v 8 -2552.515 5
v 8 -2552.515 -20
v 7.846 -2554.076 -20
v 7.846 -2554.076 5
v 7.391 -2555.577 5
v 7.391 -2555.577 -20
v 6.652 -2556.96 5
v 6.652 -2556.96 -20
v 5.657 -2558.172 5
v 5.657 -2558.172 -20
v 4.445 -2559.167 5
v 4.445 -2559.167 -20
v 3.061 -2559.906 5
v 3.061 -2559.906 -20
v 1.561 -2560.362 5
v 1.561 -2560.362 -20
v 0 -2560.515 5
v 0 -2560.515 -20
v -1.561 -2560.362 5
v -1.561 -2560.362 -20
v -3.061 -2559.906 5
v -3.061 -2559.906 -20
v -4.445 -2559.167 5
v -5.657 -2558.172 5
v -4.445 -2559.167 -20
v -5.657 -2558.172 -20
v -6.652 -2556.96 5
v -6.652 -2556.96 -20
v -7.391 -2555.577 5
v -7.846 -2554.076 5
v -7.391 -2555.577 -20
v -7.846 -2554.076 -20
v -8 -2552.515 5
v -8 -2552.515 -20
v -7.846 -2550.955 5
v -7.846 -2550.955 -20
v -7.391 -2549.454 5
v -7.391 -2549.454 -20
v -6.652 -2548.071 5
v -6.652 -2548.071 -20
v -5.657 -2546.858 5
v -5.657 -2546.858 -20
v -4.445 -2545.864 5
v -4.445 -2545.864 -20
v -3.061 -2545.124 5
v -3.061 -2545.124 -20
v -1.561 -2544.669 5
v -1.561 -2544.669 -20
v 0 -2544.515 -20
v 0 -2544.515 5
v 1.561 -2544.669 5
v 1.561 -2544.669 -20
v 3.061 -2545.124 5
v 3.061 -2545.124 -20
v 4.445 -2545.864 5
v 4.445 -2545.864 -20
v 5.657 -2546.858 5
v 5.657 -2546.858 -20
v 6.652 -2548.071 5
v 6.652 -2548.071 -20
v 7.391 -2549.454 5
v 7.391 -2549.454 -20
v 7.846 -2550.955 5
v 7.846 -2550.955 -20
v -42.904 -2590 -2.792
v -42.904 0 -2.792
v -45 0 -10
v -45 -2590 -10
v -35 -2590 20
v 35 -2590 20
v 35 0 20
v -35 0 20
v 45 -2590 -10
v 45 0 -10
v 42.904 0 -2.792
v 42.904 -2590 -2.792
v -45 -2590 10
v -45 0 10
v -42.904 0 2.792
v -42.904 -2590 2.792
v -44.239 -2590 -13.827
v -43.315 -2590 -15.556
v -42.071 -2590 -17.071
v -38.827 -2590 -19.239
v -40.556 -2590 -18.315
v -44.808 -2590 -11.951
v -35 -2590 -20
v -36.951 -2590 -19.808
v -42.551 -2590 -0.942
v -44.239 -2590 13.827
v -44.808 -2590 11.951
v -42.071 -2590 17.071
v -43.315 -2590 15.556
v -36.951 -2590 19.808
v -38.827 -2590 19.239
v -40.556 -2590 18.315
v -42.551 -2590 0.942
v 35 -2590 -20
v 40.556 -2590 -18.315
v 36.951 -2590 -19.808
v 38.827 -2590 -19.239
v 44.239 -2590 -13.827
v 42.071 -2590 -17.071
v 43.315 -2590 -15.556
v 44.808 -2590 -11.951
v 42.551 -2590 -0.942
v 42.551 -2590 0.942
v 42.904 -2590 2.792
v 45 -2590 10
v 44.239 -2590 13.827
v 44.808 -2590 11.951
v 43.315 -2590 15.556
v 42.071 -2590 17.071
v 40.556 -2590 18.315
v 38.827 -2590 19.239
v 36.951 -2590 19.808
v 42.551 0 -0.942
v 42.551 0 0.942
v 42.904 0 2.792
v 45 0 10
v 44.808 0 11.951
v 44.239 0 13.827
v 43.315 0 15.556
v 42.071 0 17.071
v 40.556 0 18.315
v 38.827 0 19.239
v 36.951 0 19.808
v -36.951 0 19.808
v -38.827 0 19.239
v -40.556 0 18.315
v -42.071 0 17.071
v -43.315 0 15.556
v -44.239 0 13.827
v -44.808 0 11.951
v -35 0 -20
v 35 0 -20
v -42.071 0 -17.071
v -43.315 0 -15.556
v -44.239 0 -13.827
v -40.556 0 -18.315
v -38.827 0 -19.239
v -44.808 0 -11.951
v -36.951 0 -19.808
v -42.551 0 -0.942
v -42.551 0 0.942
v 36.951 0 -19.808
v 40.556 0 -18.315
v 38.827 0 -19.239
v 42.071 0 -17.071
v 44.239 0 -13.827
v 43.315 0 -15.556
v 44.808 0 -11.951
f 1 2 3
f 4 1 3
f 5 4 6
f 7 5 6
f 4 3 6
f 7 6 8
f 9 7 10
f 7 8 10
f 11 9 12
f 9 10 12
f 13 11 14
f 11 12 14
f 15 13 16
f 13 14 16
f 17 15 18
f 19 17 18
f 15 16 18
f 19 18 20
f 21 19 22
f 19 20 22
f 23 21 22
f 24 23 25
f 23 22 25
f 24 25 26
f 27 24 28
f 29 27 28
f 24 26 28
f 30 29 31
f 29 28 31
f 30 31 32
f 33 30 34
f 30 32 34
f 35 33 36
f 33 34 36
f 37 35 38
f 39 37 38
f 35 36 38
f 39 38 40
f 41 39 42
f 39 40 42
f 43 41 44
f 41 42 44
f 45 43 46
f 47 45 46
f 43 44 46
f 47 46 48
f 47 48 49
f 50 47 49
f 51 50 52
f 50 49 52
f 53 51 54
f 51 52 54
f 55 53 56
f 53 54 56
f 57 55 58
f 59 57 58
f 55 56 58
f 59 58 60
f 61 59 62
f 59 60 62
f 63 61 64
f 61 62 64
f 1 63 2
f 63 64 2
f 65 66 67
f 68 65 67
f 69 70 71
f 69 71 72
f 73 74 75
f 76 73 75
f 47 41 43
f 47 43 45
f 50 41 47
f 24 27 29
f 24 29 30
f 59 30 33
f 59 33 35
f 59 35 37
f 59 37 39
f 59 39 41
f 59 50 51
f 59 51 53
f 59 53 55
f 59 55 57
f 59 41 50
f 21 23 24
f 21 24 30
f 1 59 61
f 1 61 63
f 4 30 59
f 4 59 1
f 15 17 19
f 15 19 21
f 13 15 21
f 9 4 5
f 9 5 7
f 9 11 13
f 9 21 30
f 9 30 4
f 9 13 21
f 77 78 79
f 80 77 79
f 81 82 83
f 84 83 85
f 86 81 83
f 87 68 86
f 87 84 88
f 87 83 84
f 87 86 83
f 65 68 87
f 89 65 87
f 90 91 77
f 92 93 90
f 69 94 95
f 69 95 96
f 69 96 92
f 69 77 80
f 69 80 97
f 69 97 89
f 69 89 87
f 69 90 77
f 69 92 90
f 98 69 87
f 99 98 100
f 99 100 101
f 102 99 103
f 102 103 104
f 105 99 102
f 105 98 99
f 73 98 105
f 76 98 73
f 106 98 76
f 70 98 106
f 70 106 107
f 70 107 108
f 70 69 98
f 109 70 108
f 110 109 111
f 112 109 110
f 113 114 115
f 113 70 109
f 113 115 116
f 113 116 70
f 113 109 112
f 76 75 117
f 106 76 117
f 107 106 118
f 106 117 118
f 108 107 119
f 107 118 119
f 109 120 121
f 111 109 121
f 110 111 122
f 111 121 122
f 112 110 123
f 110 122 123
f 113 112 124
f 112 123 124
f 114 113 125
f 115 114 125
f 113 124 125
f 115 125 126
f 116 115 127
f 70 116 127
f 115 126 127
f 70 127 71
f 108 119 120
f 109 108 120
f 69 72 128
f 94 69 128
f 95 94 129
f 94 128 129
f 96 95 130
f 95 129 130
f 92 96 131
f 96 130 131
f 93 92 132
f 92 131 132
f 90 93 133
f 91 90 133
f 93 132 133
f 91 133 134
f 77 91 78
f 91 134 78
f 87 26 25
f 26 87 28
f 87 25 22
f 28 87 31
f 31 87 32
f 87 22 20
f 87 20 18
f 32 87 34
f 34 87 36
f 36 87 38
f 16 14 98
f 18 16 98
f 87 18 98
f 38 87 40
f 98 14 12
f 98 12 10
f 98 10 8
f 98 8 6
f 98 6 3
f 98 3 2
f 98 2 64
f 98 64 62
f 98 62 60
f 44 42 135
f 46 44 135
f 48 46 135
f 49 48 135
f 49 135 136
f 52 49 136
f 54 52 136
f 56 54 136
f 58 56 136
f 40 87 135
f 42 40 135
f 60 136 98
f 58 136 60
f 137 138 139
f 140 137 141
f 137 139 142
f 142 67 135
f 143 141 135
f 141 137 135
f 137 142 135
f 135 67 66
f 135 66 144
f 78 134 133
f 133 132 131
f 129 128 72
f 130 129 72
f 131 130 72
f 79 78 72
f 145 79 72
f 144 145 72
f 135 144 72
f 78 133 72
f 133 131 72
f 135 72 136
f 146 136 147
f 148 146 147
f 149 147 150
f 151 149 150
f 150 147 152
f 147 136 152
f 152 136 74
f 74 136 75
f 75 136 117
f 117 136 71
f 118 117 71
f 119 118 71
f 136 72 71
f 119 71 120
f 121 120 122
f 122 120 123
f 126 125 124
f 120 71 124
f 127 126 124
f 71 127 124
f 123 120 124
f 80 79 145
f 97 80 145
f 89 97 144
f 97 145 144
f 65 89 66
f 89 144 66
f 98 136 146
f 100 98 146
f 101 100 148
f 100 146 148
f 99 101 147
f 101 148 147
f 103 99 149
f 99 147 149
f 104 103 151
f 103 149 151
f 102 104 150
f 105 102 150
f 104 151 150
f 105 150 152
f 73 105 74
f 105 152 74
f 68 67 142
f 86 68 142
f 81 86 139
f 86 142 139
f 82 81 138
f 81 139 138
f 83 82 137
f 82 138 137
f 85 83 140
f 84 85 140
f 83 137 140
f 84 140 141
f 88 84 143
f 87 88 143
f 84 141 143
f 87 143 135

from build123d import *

# Parameters (mm, degrees)
F1_DEPTH = 2590
F2_R     = 8
F3_DEPTH = 25


with BuildPart() as f1:
    # F0 (on Front) → F1 (new body)
    with BuildSketch(Plane.XZ):
        with BuildLine():
            Line((-35, -20), (35, -20))
            ThreePointArc((35, -20), (42.071068, -17.071068), (45, -10))
            Line((45, -10), (42.904106, -2.792146))
            ThreePointArc((42.904106, -2.792146), (42.506393, 0), (42.904106, 2.792146))
            Line((42.904106, 2.792146), (45, 10))
            ThreePointArc((45, 10), (42.071068, 17.071068), (35, 20))
            Line((35, 20), (-35, 20))
            ThreePointArc((-35, 20), (-42.071068, 17.071068), (-45, 10))
            Line((-45, 10), (-42.904106, 2.792146))
            ThreePointArc((-42.904106, 2.792146), (-42.506393, 0), (-42.904106, -2.792146))
            Line((-42.904106, -2.792146), (-45, -10))
            ThreePointArc((-45, -10), (-42.071068, -17.071068), (-35, -20))
        make_face()
    extrude(amount=F1_DEPTH)

    # F2 (on face) → F3 (cut)
    with BuildSketch(Plane(origin=(0, 0, -20), x_dir=(1, 0, 0), z_dir=(0, 0, -1))):
        with Locations((0, 2552.515268)):
            Circle(F2_R)
    extrude(amount=-F3_DEPTH, mode=Mode.SUBTRACT)


solid = f1.part
